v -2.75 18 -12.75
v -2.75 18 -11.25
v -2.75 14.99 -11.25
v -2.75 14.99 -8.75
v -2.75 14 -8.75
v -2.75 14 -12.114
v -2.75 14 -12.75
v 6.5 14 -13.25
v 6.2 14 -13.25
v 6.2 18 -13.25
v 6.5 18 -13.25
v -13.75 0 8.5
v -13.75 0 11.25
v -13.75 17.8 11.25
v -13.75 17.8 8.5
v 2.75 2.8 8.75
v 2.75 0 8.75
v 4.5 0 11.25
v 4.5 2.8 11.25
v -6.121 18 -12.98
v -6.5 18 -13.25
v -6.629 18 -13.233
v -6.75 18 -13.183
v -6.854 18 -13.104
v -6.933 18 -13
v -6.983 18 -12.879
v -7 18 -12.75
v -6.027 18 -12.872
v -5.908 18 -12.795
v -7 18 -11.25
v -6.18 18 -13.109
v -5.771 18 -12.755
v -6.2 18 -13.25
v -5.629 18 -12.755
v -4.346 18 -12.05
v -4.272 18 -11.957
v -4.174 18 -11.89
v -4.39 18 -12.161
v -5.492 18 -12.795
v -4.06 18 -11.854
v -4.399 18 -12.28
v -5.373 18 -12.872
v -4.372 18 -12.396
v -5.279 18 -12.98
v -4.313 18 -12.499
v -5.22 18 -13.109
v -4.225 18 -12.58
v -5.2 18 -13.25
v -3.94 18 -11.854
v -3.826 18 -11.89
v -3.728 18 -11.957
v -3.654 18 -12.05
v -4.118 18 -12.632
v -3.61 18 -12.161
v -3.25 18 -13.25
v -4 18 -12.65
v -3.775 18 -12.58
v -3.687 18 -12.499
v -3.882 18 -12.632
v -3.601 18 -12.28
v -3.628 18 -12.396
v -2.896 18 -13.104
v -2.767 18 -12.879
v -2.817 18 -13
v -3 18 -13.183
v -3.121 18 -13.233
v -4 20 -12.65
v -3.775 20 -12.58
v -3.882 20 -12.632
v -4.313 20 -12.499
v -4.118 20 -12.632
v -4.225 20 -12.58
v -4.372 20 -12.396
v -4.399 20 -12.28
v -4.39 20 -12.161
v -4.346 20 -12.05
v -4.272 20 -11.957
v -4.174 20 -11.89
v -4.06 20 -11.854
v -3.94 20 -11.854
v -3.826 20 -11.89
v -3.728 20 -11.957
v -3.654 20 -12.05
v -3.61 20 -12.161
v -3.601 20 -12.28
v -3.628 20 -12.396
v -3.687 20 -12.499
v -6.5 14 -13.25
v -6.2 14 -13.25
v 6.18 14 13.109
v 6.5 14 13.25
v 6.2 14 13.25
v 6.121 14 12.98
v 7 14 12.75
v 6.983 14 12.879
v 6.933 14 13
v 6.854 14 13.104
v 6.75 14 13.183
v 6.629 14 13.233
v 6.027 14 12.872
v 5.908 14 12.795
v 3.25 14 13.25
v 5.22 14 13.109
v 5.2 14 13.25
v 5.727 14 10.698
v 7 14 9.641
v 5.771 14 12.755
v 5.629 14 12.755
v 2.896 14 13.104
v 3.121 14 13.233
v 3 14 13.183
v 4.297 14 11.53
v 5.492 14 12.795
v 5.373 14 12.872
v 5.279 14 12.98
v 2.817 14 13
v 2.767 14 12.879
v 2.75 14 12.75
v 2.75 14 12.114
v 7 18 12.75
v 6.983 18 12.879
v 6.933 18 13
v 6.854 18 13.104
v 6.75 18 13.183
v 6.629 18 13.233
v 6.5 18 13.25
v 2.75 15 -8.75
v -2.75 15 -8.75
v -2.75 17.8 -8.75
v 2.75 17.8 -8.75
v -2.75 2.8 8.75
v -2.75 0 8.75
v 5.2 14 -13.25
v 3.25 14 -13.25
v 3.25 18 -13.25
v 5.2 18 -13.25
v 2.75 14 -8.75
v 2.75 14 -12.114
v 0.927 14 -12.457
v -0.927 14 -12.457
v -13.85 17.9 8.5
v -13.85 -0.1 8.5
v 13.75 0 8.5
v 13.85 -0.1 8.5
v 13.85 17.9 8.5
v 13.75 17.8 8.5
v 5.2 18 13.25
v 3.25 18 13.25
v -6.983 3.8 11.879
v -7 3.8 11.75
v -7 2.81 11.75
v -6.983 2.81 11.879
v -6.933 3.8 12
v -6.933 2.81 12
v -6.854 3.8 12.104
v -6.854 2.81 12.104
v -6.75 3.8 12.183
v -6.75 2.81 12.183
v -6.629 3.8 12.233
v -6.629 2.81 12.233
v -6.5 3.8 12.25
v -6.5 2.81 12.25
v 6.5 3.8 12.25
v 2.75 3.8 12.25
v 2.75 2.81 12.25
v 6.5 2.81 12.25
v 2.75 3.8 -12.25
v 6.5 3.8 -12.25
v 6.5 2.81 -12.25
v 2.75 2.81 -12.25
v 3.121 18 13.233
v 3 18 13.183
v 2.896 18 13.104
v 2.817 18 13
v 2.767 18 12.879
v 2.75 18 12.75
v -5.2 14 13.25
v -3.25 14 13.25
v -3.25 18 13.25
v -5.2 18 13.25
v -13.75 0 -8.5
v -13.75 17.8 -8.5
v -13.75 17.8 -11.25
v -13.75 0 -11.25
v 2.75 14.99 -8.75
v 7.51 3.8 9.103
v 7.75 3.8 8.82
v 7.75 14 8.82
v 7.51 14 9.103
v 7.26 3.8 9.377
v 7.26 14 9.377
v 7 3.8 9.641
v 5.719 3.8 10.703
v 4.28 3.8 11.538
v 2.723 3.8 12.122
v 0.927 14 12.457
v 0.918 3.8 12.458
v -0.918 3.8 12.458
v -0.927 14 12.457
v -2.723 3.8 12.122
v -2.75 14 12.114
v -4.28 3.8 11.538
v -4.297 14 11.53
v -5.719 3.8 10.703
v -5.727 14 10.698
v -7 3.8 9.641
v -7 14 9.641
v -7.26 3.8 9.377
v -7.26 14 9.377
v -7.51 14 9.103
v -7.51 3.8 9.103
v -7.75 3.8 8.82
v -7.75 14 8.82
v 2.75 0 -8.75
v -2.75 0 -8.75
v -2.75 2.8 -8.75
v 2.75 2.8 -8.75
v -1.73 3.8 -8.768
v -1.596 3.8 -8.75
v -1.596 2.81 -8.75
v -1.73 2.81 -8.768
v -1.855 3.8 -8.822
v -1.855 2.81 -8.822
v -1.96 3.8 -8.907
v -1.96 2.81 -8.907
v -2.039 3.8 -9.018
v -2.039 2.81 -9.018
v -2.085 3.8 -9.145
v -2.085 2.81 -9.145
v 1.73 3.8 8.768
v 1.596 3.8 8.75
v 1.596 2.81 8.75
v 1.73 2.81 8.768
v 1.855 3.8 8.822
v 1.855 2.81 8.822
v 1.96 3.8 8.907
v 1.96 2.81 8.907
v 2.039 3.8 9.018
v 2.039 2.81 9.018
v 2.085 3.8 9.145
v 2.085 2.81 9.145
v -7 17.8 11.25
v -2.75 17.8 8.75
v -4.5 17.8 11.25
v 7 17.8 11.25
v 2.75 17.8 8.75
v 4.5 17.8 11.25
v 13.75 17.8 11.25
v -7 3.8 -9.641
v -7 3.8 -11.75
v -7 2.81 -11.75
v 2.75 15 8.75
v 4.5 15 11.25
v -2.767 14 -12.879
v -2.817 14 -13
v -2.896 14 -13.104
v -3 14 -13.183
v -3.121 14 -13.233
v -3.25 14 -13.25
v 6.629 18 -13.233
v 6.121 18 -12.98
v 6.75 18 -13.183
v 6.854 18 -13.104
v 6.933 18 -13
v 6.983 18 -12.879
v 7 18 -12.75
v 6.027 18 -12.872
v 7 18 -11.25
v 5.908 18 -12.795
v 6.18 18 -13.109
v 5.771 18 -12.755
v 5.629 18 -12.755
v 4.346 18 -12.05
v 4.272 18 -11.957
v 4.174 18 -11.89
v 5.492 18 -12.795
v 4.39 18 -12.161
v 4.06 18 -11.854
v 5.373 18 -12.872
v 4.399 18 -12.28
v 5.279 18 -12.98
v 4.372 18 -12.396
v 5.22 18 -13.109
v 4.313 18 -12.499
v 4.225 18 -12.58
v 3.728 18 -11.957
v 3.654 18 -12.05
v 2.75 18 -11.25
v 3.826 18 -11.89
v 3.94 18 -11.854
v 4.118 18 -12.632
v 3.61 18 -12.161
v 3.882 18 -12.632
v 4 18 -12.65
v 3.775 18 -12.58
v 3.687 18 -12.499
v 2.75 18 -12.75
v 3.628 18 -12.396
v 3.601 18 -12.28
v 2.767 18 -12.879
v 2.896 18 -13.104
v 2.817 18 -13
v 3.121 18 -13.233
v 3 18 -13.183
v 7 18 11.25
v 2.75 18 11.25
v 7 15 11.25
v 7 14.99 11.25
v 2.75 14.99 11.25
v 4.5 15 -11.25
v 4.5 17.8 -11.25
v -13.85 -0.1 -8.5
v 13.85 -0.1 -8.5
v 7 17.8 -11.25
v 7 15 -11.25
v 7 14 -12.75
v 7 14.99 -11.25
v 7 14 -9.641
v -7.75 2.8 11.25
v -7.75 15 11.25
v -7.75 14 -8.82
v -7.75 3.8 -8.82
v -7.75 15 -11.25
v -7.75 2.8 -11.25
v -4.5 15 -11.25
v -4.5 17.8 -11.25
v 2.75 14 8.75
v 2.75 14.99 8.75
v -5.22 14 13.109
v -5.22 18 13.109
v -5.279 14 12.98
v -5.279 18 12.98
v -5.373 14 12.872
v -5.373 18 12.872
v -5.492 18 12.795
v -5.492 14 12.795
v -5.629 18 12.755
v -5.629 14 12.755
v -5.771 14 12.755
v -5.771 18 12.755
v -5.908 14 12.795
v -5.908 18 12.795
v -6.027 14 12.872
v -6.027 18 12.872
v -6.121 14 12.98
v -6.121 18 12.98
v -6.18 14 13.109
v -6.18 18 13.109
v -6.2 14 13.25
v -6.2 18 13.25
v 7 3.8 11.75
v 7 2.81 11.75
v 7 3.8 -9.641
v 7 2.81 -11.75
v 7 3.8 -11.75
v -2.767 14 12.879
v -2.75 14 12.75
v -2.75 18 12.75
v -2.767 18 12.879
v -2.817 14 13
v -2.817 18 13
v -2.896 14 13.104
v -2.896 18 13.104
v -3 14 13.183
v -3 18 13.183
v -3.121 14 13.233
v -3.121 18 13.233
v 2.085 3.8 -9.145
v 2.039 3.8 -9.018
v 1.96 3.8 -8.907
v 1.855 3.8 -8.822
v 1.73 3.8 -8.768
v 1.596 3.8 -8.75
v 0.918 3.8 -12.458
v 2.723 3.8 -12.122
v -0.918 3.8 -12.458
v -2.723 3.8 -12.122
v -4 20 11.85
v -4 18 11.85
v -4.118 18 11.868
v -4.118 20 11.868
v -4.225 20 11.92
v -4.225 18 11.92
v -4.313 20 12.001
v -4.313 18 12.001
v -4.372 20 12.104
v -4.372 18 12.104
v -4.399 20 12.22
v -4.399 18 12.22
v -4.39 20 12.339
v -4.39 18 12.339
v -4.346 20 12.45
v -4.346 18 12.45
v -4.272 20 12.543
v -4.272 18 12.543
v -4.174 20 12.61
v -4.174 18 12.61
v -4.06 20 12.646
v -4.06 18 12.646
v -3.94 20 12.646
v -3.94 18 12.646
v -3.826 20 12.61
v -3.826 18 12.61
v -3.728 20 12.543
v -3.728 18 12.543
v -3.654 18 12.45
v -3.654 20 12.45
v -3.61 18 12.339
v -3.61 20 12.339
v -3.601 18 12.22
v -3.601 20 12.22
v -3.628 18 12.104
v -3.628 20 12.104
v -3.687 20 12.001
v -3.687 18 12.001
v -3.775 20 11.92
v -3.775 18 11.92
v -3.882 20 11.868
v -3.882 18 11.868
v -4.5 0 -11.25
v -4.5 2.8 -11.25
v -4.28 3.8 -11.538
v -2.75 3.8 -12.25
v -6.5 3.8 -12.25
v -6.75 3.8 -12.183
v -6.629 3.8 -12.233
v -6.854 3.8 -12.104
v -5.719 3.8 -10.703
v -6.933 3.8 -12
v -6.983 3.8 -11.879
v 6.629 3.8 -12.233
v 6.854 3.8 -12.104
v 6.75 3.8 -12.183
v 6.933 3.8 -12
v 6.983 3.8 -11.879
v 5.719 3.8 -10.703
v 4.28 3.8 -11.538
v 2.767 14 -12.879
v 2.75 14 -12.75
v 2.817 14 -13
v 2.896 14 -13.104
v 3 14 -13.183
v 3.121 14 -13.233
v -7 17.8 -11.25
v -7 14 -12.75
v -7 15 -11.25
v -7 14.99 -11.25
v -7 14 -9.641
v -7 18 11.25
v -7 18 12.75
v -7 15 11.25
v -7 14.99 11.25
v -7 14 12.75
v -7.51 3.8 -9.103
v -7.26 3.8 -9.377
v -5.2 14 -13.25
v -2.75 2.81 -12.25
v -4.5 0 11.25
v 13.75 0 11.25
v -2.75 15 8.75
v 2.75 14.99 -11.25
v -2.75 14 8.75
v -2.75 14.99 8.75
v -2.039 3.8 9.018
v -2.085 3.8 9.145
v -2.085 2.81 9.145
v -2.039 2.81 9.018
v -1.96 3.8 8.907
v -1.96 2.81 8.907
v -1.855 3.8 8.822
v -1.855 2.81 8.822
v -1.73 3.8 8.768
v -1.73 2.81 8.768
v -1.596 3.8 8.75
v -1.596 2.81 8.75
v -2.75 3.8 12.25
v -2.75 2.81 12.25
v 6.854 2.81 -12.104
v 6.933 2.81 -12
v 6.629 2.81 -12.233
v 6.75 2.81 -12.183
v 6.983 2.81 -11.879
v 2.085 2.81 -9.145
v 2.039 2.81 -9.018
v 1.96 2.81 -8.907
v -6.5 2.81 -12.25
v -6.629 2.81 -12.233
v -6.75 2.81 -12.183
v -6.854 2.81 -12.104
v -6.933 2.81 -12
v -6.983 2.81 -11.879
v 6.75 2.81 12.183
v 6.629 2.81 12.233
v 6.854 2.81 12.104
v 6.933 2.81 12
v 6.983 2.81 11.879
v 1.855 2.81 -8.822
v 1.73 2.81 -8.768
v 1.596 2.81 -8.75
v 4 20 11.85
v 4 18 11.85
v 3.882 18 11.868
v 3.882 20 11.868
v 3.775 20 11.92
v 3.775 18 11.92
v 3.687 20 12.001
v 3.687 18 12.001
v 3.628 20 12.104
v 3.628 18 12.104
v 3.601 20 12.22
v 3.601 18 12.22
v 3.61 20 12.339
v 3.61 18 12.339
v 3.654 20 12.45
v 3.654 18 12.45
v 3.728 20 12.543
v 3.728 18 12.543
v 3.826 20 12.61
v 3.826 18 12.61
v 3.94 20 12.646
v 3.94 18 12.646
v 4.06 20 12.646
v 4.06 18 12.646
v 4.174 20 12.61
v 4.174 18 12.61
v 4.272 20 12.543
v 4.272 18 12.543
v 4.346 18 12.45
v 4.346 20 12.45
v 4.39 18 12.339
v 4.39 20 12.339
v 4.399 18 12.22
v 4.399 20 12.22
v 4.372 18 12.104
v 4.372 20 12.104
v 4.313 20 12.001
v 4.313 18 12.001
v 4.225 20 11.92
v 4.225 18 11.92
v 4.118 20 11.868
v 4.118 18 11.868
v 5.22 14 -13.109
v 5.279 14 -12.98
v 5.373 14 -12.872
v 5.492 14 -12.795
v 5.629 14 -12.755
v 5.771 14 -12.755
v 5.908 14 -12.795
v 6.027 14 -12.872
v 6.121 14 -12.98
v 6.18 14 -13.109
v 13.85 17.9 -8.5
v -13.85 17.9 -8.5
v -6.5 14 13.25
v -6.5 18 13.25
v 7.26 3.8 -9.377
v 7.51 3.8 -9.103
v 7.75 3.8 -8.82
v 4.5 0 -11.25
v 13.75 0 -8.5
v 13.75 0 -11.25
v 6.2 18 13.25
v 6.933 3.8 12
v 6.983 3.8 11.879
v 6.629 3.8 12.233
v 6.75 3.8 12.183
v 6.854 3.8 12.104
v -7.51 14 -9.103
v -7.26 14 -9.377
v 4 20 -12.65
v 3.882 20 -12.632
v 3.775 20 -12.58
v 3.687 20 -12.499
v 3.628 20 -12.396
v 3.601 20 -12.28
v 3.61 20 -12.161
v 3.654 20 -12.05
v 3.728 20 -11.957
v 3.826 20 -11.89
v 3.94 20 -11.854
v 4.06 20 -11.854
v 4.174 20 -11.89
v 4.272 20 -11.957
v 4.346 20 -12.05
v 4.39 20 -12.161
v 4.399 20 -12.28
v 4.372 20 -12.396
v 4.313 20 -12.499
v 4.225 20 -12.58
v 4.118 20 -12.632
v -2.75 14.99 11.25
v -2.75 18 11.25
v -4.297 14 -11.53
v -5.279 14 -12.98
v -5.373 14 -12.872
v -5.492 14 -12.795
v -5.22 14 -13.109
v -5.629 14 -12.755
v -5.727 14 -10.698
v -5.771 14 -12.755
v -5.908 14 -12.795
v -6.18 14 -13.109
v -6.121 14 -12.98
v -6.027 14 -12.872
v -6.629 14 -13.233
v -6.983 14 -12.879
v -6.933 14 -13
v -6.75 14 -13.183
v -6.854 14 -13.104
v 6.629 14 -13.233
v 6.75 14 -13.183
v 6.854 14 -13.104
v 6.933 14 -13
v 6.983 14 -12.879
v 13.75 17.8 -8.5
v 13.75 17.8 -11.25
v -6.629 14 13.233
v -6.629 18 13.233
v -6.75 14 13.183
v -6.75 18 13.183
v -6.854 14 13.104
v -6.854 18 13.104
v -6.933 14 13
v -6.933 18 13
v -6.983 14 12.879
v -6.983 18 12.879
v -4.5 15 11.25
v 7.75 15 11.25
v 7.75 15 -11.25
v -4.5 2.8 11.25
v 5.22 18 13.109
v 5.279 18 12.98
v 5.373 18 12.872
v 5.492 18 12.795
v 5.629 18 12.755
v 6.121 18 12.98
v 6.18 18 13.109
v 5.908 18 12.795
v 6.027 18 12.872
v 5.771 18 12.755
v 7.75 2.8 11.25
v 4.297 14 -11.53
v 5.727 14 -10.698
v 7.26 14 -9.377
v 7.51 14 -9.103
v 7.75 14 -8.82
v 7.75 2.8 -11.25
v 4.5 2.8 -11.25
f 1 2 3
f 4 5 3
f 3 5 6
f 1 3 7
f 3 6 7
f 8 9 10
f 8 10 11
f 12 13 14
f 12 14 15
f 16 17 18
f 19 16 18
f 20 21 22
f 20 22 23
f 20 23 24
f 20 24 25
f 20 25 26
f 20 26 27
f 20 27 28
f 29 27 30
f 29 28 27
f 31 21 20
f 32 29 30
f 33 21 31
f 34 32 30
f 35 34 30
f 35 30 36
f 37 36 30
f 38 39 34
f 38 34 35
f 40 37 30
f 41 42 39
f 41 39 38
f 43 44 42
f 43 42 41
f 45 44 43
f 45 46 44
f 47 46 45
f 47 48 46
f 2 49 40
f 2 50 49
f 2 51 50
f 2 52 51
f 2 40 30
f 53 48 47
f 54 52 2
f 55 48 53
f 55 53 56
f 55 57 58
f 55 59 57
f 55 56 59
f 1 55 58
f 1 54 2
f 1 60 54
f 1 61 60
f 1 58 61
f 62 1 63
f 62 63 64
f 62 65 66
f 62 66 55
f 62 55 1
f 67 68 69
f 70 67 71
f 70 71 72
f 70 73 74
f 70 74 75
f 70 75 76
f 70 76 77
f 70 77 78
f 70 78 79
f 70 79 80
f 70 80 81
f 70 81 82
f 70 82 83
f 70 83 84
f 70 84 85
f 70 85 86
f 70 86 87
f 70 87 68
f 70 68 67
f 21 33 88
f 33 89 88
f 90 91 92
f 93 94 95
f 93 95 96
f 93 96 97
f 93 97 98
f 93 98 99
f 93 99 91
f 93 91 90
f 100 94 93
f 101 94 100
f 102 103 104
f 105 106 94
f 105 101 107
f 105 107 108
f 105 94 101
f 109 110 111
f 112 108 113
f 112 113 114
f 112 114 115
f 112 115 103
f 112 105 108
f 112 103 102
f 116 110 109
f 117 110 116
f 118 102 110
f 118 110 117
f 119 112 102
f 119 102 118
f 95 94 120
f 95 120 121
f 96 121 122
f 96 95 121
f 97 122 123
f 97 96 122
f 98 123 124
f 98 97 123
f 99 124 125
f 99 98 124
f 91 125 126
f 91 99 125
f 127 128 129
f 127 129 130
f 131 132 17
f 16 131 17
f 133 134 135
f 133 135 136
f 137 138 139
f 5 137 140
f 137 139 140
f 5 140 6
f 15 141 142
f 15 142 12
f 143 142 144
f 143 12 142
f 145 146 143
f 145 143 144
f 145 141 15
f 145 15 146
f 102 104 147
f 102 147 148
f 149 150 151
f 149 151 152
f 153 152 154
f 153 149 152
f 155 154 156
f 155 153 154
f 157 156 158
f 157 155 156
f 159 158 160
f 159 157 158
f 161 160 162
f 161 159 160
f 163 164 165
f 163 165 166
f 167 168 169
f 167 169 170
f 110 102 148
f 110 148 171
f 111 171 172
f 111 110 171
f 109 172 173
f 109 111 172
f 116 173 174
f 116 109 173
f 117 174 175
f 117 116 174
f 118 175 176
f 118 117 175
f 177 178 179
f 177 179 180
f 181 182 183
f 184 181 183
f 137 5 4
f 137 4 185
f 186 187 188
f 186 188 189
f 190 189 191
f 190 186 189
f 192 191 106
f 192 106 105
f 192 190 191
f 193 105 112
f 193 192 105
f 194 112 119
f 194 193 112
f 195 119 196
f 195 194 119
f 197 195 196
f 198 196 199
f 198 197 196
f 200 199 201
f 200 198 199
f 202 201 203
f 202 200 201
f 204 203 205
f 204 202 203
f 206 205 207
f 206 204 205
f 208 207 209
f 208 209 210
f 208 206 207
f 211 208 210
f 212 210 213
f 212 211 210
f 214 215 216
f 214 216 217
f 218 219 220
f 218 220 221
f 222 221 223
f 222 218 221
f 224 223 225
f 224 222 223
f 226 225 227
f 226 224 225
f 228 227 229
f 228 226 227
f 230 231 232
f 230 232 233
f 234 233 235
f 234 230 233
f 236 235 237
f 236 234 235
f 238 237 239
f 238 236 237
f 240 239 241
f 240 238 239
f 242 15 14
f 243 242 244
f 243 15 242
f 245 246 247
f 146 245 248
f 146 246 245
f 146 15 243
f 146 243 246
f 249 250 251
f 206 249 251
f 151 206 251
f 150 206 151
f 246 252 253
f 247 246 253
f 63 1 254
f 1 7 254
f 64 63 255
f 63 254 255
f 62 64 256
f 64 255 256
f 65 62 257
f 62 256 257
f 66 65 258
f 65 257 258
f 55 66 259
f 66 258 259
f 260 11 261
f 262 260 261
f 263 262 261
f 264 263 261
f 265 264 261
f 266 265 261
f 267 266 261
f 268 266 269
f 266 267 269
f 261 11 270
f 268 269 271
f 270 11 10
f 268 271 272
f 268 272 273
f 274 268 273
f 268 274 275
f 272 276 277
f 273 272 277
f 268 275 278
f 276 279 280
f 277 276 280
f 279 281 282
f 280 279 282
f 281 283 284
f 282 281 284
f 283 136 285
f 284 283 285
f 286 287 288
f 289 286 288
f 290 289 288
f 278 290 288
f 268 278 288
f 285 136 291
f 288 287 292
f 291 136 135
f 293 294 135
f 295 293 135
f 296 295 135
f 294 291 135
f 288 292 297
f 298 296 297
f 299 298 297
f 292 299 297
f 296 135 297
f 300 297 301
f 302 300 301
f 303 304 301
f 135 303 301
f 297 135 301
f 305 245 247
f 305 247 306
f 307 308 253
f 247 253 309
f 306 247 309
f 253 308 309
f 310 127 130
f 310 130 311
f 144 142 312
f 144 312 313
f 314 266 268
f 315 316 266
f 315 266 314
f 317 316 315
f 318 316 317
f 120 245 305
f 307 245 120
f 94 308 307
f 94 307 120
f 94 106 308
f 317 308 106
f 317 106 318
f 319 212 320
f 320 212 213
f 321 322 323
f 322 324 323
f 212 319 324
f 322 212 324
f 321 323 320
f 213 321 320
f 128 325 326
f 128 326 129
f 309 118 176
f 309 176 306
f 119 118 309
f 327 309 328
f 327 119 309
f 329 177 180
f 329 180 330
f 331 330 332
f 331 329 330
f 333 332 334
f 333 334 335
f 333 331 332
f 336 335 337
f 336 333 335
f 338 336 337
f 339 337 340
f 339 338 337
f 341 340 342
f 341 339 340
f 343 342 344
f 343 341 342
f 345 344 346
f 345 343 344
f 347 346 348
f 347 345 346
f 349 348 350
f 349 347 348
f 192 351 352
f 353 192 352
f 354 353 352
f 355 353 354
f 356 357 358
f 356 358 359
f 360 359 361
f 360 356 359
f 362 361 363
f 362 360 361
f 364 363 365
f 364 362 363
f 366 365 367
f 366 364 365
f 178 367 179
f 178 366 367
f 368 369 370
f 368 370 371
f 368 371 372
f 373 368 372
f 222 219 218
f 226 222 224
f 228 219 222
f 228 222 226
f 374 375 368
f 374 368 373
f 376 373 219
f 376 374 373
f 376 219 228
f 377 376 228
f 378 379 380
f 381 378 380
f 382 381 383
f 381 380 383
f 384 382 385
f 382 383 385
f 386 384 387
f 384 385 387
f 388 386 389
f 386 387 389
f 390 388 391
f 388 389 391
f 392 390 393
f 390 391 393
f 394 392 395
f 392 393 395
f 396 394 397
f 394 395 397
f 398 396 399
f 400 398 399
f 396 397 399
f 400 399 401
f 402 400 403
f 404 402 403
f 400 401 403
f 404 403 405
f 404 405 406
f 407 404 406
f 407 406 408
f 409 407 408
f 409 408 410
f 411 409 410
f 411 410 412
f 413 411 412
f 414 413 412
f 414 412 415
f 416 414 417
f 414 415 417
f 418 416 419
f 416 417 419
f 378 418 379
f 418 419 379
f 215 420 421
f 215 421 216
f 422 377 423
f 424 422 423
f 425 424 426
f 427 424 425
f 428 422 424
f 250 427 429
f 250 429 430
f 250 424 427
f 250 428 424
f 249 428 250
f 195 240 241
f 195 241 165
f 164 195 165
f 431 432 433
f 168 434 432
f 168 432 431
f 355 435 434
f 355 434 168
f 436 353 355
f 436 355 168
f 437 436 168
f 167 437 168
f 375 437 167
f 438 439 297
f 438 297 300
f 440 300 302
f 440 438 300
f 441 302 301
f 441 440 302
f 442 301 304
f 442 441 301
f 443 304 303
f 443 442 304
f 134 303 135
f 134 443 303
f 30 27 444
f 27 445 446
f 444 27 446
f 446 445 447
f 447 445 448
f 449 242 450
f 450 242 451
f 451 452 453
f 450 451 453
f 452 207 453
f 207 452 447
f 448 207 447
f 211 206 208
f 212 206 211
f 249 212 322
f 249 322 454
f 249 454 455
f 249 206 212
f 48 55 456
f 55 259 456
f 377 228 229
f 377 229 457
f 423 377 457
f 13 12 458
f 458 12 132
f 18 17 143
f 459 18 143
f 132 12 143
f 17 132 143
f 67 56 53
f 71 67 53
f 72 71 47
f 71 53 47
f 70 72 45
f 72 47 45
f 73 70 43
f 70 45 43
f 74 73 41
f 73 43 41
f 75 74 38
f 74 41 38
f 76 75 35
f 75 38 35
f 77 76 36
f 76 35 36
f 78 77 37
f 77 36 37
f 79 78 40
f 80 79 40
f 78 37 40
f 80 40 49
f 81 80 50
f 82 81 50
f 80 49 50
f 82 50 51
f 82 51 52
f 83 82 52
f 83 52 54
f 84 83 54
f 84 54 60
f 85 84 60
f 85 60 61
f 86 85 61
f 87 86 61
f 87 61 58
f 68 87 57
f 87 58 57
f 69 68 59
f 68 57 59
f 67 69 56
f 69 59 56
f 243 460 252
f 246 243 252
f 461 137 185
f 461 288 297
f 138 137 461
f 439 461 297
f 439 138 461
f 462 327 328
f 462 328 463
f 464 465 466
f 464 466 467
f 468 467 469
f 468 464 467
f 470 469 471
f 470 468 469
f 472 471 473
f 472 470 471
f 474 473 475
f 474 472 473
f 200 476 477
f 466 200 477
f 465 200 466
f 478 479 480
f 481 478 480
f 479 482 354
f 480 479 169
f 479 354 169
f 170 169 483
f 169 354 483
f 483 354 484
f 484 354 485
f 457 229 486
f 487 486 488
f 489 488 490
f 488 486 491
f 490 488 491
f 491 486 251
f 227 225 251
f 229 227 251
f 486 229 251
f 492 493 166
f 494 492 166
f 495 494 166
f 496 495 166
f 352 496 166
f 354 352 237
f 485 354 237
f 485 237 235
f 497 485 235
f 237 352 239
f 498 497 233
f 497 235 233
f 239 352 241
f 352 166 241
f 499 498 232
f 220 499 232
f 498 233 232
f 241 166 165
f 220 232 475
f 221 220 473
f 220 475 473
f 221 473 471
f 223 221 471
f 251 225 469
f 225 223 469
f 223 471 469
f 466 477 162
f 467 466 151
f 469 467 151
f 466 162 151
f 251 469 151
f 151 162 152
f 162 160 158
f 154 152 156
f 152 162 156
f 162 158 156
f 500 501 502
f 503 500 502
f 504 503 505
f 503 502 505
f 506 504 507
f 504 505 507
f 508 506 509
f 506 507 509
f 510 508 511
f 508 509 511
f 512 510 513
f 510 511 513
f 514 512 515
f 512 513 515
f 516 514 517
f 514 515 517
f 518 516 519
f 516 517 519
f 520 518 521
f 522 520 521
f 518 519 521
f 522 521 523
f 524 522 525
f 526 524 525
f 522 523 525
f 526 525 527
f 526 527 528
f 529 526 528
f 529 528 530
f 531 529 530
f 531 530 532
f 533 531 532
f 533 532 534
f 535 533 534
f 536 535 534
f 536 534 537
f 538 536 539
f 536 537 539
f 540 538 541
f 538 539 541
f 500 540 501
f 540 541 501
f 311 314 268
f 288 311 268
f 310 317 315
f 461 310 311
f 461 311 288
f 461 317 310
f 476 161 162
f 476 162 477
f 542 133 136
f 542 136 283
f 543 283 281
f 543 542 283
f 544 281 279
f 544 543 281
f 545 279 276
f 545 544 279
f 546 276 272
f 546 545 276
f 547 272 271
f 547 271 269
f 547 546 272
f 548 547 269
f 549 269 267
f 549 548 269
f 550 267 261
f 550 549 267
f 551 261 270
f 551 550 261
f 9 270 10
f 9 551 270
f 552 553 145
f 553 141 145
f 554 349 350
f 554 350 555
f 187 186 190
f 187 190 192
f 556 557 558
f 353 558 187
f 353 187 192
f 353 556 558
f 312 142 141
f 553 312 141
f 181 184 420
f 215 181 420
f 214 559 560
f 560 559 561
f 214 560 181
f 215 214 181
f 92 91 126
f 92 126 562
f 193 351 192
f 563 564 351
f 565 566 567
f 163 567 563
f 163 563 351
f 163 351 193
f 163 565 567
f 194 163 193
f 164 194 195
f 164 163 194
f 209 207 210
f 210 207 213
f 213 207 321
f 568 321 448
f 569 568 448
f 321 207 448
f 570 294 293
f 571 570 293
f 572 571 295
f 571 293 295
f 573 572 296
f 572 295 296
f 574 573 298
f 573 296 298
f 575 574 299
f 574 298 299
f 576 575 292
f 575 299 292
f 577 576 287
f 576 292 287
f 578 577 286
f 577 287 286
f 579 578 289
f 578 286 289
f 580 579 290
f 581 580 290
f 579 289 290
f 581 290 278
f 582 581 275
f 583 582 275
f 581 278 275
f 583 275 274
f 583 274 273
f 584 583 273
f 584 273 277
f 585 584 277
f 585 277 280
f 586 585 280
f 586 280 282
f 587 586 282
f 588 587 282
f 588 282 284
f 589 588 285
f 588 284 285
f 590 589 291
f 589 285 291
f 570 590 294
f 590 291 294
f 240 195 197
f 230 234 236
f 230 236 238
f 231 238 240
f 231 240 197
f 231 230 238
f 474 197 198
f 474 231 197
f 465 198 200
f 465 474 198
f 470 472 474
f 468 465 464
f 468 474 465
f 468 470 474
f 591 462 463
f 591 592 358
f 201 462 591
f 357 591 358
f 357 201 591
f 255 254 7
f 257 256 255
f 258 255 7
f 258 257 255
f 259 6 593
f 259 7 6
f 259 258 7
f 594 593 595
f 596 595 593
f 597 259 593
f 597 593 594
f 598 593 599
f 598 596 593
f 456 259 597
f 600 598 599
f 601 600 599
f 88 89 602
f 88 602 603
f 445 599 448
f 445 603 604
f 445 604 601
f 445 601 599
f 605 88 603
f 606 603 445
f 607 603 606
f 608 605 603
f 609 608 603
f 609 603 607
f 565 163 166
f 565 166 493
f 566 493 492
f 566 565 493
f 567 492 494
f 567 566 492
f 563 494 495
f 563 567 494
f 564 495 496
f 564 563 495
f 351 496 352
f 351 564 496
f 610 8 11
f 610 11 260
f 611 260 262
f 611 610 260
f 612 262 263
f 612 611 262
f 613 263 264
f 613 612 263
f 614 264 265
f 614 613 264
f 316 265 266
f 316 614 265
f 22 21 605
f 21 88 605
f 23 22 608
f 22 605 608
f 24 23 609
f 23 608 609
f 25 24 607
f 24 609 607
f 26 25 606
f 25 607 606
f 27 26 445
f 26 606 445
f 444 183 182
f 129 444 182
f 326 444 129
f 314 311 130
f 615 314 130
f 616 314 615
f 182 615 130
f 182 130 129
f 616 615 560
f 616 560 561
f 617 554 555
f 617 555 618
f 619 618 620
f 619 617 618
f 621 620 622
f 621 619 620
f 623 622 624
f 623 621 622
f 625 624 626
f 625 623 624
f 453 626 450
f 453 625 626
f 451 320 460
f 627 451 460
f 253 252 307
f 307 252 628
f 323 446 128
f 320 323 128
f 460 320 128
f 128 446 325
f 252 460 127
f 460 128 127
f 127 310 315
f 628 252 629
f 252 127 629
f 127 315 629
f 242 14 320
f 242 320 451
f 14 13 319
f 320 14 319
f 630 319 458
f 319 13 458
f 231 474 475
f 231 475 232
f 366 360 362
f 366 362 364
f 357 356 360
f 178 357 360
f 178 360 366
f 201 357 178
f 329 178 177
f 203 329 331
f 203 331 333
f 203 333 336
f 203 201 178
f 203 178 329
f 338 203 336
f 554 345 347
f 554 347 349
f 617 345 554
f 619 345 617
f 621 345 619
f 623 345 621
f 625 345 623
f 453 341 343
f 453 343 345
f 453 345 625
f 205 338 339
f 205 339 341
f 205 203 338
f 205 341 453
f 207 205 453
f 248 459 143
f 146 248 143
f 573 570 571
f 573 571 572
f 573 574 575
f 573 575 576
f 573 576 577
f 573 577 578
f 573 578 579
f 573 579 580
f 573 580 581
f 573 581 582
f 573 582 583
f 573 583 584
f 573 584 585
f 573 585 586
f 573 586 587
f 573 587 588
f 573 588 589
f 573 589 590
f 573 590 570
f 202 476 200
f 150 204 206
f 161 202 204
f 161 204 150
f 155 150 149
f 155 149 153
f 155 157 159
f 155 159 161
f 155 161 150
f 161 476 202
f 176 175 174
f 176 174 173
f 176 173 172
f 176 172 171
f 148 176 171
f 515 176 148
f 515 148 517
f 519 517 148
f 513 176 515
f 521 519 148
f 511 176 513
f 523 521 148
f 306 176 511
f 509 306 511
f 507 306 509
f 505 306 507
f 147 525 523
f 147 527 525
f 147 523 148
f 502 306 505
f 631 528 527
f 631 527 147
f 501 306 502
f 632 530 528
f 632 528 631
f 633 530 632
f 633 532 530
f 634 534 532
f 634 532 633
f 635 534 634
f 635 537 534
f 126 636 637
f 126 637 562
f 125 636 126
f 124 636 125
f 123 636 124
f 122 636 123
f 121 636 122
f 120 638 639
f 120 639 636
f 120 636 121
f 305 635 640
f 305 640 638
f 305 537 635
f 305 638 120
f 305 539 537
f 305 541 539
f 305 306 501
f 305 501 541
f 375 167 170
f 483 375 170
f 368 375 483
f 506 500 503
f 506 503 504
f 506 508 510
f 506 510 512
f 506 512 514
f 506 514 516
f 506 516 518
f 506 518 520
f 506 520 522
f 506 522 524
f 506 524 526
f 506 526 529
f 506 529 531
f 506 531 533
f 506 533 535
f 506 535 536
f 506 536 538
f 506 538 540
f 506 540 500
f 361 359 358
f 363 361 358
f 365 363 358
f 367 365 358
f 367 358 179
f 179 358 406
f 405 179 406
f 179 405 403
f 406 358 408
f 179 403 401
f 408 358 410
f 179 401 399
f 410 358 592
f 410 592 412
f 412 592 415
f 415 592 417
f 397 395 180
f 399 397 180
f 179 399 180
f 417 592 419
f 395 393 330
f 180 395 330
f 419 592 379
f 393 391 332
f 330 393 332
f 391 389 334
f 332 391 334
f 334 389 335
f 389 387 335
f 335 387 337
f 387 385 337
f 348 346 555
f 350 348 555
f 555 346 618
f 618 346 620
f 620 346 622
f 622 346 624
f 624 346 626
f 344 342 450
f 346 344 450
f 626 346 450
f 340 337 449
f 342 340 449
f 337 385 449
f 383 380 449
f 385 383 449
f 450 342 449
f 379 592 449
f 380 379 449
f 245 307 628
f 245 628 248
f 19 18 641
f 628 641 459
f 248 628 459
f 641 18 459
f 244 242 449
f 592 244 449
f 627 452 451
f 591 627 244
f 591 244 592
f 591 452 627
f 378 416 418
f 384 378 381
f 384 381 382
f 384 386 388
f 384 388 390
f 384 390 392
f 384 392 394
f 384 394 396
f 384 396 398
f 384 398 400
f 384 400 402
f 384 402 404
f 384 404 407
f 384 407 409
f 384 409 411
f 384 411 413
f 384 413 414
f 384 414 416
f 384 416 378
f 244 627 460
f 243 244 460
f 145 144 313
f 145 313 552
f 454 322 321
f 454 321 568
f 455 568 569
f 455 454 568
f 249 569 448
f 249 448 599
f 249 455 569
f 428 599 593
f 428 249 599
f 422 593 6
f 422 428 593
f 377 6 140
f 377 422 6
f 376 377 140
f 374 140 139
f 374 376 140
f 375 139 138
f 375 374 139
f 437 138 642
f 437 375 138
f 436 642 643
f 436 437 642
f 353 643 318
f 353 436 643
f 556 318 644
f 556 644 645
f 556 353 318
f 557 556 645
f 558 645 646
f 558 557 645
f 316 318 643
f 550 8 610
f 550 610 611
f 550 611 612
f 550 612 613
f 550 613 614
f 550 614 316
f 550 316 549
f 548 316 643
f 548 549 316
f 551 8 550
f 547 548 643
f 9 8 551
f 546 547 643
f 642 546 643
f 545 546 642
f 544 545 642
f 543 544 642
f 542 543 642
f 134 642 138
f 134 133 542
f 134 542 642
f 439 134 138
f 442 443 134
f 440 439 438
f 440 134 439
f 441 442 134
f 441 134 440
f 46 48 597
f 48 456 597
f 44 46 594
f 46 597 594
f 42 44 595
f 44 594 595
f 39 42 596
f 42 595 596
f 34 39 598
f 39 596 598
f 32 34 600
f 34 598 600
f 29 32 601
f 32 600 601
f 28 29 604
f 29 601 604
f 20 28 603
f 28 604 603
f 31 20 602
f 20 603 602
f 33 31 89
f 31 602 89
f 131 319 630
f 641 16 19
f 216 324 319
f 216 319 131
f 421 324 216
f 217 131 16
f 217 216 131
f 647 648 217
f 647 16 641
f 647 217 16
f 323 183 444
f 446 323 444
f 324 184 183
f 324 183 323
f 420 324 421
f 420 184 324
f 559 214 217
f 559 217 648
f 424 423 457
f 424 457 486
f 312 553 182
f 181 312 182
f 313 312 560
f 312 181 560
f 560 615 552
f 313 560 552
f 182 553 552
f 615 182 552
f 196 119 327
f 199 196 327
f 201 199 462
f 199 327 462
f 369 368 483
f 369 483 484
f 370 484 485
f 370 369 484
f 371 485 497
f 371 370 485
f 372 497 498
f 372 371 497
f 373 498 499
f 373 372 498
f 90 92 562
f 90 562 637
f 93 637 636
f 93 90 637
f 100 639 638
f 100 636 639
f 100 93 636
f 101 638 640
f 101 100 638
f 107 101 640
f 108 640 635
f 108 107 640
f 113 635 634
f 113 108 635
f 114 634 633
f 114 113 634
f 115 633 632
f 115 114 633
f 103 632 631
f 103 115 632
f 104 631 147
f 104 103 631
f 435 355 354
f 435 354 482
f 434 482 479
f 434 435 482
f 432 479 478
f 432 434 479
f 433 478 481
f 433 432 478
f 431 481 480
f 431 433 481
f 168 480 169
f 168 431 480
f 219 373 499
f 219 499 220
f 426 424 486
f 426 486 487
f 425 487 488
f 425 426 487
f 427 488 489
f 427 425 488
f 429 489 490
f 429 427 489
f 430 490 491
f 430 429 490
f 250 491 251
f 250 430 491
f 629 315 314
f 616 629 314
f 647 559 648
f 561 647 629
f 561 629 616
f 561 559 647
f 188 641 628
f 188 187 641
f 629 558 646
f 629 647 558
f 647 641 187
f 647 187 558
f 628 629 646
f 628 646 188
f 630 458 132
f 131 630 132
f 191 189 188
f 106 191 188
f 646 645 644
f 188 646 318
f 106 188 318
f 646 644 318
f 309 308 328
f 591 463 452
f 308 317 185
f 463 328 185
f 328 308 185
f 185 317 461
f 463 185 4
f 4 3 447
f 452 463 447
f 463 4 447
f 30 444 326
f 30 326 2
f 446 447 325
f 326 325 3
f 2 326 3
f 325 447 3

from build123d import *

# Parameters (mm, degrees)
SKETCH_1_W               = 27.5
SKETCH_1_H               = 22.5
EXTRUDE_1_DEPTH          = 17.8
CUT_EXTRUDE_1_DEPTH      = 26.148856833
CUT_EXTRUDE_1_DEPTH_BACK = 26.148856833
SKETCH_3_W               = 15.5
SKETCH_3_H               = 12.2
CUT_EXTRUDE_2_DEPTH      = 26.148856833
EXTRUDE_2_DEPTH          = 5.1
EXTRUDE_2_DEPTH_BACK     = 5.1
EXTRUDE_3_DEPTH          = 0.99
EXTRUDE_4_DEPTH          = 0.99
EXTRUDE_5_DEPTH          = 3.01
SKETCH_8_R               = 0.4
EXTRUDE_6_DEPTH          = 2
SKETCH_9_W               = 27.7
SKETCH_9_H               = 18
SKETCH_9_W_2             = 27.5
SKETCH_9_H_2             = 17.8
EXTRUDE_7_DEPTH          = 8.5


with BuildPart() as part:
    # Эскиз1 → Бобышка-Вытянуть1 (new body)
    with BuildSketch(Plane(origin=(0, 0, 0), x_dir=(1, 0, 0), z_dir=(0, 1, 0))):
        Rectangle(SKETCH_1_W, SKETCH_1_H)
    extrude(amount=EXTRUDE_1_DEPTH)

    # Эскиз3 → Вырез-Вытянуть1 (cut, two sides: drawn at the far end of the back side and taken through both)
    with BuildSketch(Plane.XY.offset(-CUT_EXTRUDE_1_DEPTH_BACK)):
        with Locations((0, 8.9)):
            Rectangle(SKETCH_3_W, SKETCH_3_H)
    extrude(amount=CUT_EXTRUDE_1_DEPTH + CUT_EXTRUDE_1_DEPTH_BACK, mode=Mode.SUBTRACT)

    # Эскиз4 → Вырез-Вытянуть2 (cut, through all)
    with BuildSketch(Plane(origin=(0, 0, 0), x_dir=(1, 0, 0), z_dir=(0, 1, 0))):
        Polygon((-4.5, 11.25), (-2.75, 8.75), (2.75, 8.75), (4.5, 11.25), align=None)
        Polygon((4.5, -11.25), (-4.5, -11.25), (-2.75, -8.75), (2.75, -8.75), align=None)
    extrude(amount=CUT_EXTRUDE_2_DEPTH, mode=Mode.SUBTRACT)

    # Эскиз2 → Бобышка-Вытянуть2 (add, two sides: drawn at the far end of the back side and taken through both)
    with BuildSketch(Plane(origin=(0, 8.9, 0), x_dir=(1, 0, 0), z_dir=(0, 1, 0)).offset(-EXTRUDE_2_DEPTH_BACK)):
        with BuildLine():
            Line((-10, -2.5), (-10, 2.5))
            ThreePointArc((-10, 2.5), (0, 12.5), (10, 2.5))
            Line((10, 2.5), (10, -2.5))
            ThreePointArc((10, -2.5), (0, -12.5), (-10, -2.5))
        make_face()
    extrude(amount=EXTRUDE_2_DEPTH + EXTRUDE_2_DEPTH_BACK)

    # Эскиз5 → Бобышка-Вытянуть3 (add)
    with BuildSketch(Plane.XZ.offset(-3.8)):
        with BuildLine():
            Line((7, 11.75), (7, -11.75))
            ThreePointArc((7, -11.75), (6.853553391, -12.103553391), (6.5, -12.25))
            Line((6.5, -12.25), (2.75, -12.25))
            Line((2.75, -12.25), (2.084693312, -9.145235456))
            ThreePointArc((2.084693312, -9.145235456), (1.910130877, -8.861166956), (1.595792105, -8.75))
            Line((1.595792105, -8.75), (-1.595792105, -8.75))
            ThreePointArc((-1.595792105, -8.75), (-1.910130877, -8.861166956), (-2.084693312, -9.145235456))
            Line((-2.084693312, -9.145235456), (-2.75, -12.25))
            Line((-2.75, -12.25), (-6.5, -12.25))
            ThreePointArc((-6.5, -12.25), (-6.853553391, -12.103553391), (-7, -11.75))
            Line((-7, -11.75), (-7, 11.75))
            ThreePointArc((-7, 11.75), (-6.853553391, 12.103553391), (-6.5, 12.25))
            Line((-6.5, 12.25), (-2.75, 12.25))
            Line((-2.75, 12.25), (-2.084693312, 9.145235456))
            ThreePointArc((-2.084693312, 9.145235456), (-1.910130877, 8.861166956), (-1.595792105, 8.75))
            Line((-1.595792105, 8.75), (1.595792105, 8.75))
            ThreePointArc((1.595792105, 8.75), (1.910130877, 8.861166956), (2.084693312, 9.145235456))
            Line((2.084693312, 9.145235456), (2.75, 12.25))
            Line((2.75, 12.25), (6.5, 12.25))
            ThreePointArc((6.5, 12.25), (6.853553391, 12.103553391), (7, 11.75))
        make_face()
    extrude(amount=EXTRUDE_3_DEPTH)

    # Эскиз6 → Бобышка-Вытянуть4 (add)
    with BuildSketch(Plane(origin=(0, 14, 0), x_dir=(1, 0, 0), z_dir=(0, 1, 0))):
        with BuildLine():
            Line((-7, -12.75), (-7, 12.75))
            ThreePointArc((-7, 12.75), (-6.853553391, 13.103553391), (-6.5, 13.25))
            Line((-6.5, 13.25), (-6.2, 13.25))
            ThreePointArc((-6.2, 13.25), (-5.7, 12.75), (-5.2, 13.25))
            Line((-5.2, 13.25), (-3.25, 13.25))
            ThreePointArc((-3.25, 13.25), (-2.896446609, 13.103553391), (-2.75, 12.75))
            Line((-2.75, 12.75), (-2.75, 8.75))
            Line((-2.75, 8.75), (2.75, 8.75))
            Line((2.75, 8.75), (2.75, 12.75))
            ThreePointArc((2.75, 12.75), (2.896446609, 13.103553391), (3.25, 13.25))
            Line((3.25, 13.25), (5.2, 13.25))
            ThreePointArc((5.2, 13.25), (5.7, 12.75), (6.2, 13.25))
            Line((6.2, 13.25), (6.5, 13.25))
            ThreePointArc((6.5, 13.25), (6.853553391, 13.103553391), (7, 12.75))
            Line((7, 12.75), (7, -12.75))
            ThreePointArc((7, -12.75), (6.853553391, -13.103553391), (6.5, -13.25))
            Line((6.5, -13.25), (6.2, -13.25))
            ThreePointArc((6.2, -13.25), (5.7, -12.75), (5.2, -13.25))
            Line((5.2, -13.25), (3.25, -13.25))
            ThreePointArc((3.25, -13.25), (2.896446609, -13.103553391), (2.75, -12.75))
            Line((2.75, -12.75), (2.75, -8.75))
            Line((2.75, -8.75), (-2.75, -8.75))
            Line((-2.75, -8.75), (-2.75, -12.75))
            ThreePointArc((-2.75, -12.75), (-2.896446609, -13.103553391), (-3.25, -13.25))
            Line((-3.25, -13.25), (-5.2, -13.25))
            ThreePointArc((-5.2, -13.25), (-5.7, -12.75), (-6.2, -13.25))
            Line((-6.2, -13.25), (-6.5, -13.25))
            ThreePointArc((-6.5, -13.25), (-6.853553391, -13.103553391), (-7, -12.75))
        make_face()
    extrude(amount=EXTRUDE_4_DEPTH)

    # Эскиз7 → Бобышка-Вытянуть5 (add)
    with BuildSketch(Plane(origin=(0, 14.99, 0), x_dir=(1, 0, 0), z_dir=(0, 1, 0))):
        with BuildLine():
            Line((-7, 11.25), (-2.75, 11.25))
            Line((-2.75, 11.25), (-2.75, 12.75))
            ThreePointArc((-2.75, 12.75), (-2.896446609, 13.103553391), (-3.25, 13.25))
            Line((-3.25, 13.25), (-5.2, 13.25))
            ThreePointArc((-5.2, 13.25), (-5.7, 12.75), (-6.2, 13.25))
            Line((-6.2, 13.25), (-6.5, 13.25))
            ThreePointArc((-6.5, 13.25), (-6.853553391, 13.103553391), (-7, 12.75))
            Line((-7, 12.75), (-7, 11.25))
        make_face()
        with BuildLine():
            Line((7, 11.25), (2.75, 11.25))
            Line((2.75, 11.25), (2.75, 12.75))
            ThreePointArc((2.75, 12.75), (2.896446609, 13.103553391), (3.25, 13.25))
            Line((3.25, 13.25), (5.2, 13.25))
            ThreePointArc((5.2, 13.25), (5.7, 12.75), (6.2, 13.25))
            Line((6.2, 13.25), (6.5, 13.25))
            ThreePointArc((6.5, 13.25), (6.853553391, 13.103553391), (7, 12.75))
            Line((7, 12.75), (7, 11.25))
        make_face()
        with BuildLine():
            Line((7, -11.25), (2.75, -11.25))
            Line((2.75, -11.25), (2.75, -12.75))
            ThreePointArc((2.75, -12.75), (2.896446609, -13.103553391), (3.25, -13.25))
            Line((3.25, -13.25), (5.2, -13.25))
            ThreePointArc((5.2, -13.25), (5.7, -12.75), (6.2, -13.25))
            Line((6.2, -13.25), (6.5, -13.25))
            ThreePointArc((6.5, -13.25), (6.853553391, -13.103553391), (7, -12.75))
            Line((7, -12.75), (7, -11.25))
        make_face()
        with BuildLine():
            Line((-7, -11.25), (-2.75, -11.25))
            Line((-2.75, -11.25), (-2.75, -12.75))
            ThreePointArc((-2.75, -12.75), (-2.896446609, -13.103553391), (-3.25, -13.25))
            Line((-3.25, -13.25), (-5.2, -13.25))
            ThreePointArc((-5.2, -13.25), (-5.7, -12.75), (-6.2, -13.25))
            Line((-6.2, -13.25), (-6.5, -13.25))
            ThreePointArc((-6.5, -13.25), (-6.853553391, -13.103553391), (-7, -12.75))
            Line((-7, -12.75), (-7, -11.25))
        make_face()
    extrude(amount=EXTRUDE_5_DEPTH)

    # Эскиз8 → Бобышка-Вытянуть6 (add)
    with BuildSketch(Plane(origin=(0, 18, 0), x_dir=(1, 0, 0), z_dir=(0, 1, 0))):
        with Locations(Location((4, -12.25, 0), (0, 0, 90))):
            Circle(SKETCH_8_R)
        with Locations(Location((-4, -12.25, 0), (0, 0, 90))):
            Circle(SKETCH_8_R)
        with Locations(Location((-4, 12.25, 0), (0, 0, 90))):
            Circle(SKETCH_8_R)
        with Locations(Location((4, 12.25, 0), (0, 0, 90))):
            Circle(SKETCH_8_R)
    extrude(amount=EXTRUDE_6_DEPTH)

    # Эскиз9 → Бобышка-Вытянуть7 (add, symmetric)
    with BuildSketch(Plane.XY):
        with Locations((0, 8.9)):
            Rectangle(SKETCH_9_W, SKETCH_9_H)
        with Locations((0, 8.9)):
            Rectangle(SKETCH_9_W_2, SKETCH_9_H_2, mode=Mode.SUBTRACT)
    extrude(amount=EXTRUDE_7_DEPTH, both=True)


solid = part.part
